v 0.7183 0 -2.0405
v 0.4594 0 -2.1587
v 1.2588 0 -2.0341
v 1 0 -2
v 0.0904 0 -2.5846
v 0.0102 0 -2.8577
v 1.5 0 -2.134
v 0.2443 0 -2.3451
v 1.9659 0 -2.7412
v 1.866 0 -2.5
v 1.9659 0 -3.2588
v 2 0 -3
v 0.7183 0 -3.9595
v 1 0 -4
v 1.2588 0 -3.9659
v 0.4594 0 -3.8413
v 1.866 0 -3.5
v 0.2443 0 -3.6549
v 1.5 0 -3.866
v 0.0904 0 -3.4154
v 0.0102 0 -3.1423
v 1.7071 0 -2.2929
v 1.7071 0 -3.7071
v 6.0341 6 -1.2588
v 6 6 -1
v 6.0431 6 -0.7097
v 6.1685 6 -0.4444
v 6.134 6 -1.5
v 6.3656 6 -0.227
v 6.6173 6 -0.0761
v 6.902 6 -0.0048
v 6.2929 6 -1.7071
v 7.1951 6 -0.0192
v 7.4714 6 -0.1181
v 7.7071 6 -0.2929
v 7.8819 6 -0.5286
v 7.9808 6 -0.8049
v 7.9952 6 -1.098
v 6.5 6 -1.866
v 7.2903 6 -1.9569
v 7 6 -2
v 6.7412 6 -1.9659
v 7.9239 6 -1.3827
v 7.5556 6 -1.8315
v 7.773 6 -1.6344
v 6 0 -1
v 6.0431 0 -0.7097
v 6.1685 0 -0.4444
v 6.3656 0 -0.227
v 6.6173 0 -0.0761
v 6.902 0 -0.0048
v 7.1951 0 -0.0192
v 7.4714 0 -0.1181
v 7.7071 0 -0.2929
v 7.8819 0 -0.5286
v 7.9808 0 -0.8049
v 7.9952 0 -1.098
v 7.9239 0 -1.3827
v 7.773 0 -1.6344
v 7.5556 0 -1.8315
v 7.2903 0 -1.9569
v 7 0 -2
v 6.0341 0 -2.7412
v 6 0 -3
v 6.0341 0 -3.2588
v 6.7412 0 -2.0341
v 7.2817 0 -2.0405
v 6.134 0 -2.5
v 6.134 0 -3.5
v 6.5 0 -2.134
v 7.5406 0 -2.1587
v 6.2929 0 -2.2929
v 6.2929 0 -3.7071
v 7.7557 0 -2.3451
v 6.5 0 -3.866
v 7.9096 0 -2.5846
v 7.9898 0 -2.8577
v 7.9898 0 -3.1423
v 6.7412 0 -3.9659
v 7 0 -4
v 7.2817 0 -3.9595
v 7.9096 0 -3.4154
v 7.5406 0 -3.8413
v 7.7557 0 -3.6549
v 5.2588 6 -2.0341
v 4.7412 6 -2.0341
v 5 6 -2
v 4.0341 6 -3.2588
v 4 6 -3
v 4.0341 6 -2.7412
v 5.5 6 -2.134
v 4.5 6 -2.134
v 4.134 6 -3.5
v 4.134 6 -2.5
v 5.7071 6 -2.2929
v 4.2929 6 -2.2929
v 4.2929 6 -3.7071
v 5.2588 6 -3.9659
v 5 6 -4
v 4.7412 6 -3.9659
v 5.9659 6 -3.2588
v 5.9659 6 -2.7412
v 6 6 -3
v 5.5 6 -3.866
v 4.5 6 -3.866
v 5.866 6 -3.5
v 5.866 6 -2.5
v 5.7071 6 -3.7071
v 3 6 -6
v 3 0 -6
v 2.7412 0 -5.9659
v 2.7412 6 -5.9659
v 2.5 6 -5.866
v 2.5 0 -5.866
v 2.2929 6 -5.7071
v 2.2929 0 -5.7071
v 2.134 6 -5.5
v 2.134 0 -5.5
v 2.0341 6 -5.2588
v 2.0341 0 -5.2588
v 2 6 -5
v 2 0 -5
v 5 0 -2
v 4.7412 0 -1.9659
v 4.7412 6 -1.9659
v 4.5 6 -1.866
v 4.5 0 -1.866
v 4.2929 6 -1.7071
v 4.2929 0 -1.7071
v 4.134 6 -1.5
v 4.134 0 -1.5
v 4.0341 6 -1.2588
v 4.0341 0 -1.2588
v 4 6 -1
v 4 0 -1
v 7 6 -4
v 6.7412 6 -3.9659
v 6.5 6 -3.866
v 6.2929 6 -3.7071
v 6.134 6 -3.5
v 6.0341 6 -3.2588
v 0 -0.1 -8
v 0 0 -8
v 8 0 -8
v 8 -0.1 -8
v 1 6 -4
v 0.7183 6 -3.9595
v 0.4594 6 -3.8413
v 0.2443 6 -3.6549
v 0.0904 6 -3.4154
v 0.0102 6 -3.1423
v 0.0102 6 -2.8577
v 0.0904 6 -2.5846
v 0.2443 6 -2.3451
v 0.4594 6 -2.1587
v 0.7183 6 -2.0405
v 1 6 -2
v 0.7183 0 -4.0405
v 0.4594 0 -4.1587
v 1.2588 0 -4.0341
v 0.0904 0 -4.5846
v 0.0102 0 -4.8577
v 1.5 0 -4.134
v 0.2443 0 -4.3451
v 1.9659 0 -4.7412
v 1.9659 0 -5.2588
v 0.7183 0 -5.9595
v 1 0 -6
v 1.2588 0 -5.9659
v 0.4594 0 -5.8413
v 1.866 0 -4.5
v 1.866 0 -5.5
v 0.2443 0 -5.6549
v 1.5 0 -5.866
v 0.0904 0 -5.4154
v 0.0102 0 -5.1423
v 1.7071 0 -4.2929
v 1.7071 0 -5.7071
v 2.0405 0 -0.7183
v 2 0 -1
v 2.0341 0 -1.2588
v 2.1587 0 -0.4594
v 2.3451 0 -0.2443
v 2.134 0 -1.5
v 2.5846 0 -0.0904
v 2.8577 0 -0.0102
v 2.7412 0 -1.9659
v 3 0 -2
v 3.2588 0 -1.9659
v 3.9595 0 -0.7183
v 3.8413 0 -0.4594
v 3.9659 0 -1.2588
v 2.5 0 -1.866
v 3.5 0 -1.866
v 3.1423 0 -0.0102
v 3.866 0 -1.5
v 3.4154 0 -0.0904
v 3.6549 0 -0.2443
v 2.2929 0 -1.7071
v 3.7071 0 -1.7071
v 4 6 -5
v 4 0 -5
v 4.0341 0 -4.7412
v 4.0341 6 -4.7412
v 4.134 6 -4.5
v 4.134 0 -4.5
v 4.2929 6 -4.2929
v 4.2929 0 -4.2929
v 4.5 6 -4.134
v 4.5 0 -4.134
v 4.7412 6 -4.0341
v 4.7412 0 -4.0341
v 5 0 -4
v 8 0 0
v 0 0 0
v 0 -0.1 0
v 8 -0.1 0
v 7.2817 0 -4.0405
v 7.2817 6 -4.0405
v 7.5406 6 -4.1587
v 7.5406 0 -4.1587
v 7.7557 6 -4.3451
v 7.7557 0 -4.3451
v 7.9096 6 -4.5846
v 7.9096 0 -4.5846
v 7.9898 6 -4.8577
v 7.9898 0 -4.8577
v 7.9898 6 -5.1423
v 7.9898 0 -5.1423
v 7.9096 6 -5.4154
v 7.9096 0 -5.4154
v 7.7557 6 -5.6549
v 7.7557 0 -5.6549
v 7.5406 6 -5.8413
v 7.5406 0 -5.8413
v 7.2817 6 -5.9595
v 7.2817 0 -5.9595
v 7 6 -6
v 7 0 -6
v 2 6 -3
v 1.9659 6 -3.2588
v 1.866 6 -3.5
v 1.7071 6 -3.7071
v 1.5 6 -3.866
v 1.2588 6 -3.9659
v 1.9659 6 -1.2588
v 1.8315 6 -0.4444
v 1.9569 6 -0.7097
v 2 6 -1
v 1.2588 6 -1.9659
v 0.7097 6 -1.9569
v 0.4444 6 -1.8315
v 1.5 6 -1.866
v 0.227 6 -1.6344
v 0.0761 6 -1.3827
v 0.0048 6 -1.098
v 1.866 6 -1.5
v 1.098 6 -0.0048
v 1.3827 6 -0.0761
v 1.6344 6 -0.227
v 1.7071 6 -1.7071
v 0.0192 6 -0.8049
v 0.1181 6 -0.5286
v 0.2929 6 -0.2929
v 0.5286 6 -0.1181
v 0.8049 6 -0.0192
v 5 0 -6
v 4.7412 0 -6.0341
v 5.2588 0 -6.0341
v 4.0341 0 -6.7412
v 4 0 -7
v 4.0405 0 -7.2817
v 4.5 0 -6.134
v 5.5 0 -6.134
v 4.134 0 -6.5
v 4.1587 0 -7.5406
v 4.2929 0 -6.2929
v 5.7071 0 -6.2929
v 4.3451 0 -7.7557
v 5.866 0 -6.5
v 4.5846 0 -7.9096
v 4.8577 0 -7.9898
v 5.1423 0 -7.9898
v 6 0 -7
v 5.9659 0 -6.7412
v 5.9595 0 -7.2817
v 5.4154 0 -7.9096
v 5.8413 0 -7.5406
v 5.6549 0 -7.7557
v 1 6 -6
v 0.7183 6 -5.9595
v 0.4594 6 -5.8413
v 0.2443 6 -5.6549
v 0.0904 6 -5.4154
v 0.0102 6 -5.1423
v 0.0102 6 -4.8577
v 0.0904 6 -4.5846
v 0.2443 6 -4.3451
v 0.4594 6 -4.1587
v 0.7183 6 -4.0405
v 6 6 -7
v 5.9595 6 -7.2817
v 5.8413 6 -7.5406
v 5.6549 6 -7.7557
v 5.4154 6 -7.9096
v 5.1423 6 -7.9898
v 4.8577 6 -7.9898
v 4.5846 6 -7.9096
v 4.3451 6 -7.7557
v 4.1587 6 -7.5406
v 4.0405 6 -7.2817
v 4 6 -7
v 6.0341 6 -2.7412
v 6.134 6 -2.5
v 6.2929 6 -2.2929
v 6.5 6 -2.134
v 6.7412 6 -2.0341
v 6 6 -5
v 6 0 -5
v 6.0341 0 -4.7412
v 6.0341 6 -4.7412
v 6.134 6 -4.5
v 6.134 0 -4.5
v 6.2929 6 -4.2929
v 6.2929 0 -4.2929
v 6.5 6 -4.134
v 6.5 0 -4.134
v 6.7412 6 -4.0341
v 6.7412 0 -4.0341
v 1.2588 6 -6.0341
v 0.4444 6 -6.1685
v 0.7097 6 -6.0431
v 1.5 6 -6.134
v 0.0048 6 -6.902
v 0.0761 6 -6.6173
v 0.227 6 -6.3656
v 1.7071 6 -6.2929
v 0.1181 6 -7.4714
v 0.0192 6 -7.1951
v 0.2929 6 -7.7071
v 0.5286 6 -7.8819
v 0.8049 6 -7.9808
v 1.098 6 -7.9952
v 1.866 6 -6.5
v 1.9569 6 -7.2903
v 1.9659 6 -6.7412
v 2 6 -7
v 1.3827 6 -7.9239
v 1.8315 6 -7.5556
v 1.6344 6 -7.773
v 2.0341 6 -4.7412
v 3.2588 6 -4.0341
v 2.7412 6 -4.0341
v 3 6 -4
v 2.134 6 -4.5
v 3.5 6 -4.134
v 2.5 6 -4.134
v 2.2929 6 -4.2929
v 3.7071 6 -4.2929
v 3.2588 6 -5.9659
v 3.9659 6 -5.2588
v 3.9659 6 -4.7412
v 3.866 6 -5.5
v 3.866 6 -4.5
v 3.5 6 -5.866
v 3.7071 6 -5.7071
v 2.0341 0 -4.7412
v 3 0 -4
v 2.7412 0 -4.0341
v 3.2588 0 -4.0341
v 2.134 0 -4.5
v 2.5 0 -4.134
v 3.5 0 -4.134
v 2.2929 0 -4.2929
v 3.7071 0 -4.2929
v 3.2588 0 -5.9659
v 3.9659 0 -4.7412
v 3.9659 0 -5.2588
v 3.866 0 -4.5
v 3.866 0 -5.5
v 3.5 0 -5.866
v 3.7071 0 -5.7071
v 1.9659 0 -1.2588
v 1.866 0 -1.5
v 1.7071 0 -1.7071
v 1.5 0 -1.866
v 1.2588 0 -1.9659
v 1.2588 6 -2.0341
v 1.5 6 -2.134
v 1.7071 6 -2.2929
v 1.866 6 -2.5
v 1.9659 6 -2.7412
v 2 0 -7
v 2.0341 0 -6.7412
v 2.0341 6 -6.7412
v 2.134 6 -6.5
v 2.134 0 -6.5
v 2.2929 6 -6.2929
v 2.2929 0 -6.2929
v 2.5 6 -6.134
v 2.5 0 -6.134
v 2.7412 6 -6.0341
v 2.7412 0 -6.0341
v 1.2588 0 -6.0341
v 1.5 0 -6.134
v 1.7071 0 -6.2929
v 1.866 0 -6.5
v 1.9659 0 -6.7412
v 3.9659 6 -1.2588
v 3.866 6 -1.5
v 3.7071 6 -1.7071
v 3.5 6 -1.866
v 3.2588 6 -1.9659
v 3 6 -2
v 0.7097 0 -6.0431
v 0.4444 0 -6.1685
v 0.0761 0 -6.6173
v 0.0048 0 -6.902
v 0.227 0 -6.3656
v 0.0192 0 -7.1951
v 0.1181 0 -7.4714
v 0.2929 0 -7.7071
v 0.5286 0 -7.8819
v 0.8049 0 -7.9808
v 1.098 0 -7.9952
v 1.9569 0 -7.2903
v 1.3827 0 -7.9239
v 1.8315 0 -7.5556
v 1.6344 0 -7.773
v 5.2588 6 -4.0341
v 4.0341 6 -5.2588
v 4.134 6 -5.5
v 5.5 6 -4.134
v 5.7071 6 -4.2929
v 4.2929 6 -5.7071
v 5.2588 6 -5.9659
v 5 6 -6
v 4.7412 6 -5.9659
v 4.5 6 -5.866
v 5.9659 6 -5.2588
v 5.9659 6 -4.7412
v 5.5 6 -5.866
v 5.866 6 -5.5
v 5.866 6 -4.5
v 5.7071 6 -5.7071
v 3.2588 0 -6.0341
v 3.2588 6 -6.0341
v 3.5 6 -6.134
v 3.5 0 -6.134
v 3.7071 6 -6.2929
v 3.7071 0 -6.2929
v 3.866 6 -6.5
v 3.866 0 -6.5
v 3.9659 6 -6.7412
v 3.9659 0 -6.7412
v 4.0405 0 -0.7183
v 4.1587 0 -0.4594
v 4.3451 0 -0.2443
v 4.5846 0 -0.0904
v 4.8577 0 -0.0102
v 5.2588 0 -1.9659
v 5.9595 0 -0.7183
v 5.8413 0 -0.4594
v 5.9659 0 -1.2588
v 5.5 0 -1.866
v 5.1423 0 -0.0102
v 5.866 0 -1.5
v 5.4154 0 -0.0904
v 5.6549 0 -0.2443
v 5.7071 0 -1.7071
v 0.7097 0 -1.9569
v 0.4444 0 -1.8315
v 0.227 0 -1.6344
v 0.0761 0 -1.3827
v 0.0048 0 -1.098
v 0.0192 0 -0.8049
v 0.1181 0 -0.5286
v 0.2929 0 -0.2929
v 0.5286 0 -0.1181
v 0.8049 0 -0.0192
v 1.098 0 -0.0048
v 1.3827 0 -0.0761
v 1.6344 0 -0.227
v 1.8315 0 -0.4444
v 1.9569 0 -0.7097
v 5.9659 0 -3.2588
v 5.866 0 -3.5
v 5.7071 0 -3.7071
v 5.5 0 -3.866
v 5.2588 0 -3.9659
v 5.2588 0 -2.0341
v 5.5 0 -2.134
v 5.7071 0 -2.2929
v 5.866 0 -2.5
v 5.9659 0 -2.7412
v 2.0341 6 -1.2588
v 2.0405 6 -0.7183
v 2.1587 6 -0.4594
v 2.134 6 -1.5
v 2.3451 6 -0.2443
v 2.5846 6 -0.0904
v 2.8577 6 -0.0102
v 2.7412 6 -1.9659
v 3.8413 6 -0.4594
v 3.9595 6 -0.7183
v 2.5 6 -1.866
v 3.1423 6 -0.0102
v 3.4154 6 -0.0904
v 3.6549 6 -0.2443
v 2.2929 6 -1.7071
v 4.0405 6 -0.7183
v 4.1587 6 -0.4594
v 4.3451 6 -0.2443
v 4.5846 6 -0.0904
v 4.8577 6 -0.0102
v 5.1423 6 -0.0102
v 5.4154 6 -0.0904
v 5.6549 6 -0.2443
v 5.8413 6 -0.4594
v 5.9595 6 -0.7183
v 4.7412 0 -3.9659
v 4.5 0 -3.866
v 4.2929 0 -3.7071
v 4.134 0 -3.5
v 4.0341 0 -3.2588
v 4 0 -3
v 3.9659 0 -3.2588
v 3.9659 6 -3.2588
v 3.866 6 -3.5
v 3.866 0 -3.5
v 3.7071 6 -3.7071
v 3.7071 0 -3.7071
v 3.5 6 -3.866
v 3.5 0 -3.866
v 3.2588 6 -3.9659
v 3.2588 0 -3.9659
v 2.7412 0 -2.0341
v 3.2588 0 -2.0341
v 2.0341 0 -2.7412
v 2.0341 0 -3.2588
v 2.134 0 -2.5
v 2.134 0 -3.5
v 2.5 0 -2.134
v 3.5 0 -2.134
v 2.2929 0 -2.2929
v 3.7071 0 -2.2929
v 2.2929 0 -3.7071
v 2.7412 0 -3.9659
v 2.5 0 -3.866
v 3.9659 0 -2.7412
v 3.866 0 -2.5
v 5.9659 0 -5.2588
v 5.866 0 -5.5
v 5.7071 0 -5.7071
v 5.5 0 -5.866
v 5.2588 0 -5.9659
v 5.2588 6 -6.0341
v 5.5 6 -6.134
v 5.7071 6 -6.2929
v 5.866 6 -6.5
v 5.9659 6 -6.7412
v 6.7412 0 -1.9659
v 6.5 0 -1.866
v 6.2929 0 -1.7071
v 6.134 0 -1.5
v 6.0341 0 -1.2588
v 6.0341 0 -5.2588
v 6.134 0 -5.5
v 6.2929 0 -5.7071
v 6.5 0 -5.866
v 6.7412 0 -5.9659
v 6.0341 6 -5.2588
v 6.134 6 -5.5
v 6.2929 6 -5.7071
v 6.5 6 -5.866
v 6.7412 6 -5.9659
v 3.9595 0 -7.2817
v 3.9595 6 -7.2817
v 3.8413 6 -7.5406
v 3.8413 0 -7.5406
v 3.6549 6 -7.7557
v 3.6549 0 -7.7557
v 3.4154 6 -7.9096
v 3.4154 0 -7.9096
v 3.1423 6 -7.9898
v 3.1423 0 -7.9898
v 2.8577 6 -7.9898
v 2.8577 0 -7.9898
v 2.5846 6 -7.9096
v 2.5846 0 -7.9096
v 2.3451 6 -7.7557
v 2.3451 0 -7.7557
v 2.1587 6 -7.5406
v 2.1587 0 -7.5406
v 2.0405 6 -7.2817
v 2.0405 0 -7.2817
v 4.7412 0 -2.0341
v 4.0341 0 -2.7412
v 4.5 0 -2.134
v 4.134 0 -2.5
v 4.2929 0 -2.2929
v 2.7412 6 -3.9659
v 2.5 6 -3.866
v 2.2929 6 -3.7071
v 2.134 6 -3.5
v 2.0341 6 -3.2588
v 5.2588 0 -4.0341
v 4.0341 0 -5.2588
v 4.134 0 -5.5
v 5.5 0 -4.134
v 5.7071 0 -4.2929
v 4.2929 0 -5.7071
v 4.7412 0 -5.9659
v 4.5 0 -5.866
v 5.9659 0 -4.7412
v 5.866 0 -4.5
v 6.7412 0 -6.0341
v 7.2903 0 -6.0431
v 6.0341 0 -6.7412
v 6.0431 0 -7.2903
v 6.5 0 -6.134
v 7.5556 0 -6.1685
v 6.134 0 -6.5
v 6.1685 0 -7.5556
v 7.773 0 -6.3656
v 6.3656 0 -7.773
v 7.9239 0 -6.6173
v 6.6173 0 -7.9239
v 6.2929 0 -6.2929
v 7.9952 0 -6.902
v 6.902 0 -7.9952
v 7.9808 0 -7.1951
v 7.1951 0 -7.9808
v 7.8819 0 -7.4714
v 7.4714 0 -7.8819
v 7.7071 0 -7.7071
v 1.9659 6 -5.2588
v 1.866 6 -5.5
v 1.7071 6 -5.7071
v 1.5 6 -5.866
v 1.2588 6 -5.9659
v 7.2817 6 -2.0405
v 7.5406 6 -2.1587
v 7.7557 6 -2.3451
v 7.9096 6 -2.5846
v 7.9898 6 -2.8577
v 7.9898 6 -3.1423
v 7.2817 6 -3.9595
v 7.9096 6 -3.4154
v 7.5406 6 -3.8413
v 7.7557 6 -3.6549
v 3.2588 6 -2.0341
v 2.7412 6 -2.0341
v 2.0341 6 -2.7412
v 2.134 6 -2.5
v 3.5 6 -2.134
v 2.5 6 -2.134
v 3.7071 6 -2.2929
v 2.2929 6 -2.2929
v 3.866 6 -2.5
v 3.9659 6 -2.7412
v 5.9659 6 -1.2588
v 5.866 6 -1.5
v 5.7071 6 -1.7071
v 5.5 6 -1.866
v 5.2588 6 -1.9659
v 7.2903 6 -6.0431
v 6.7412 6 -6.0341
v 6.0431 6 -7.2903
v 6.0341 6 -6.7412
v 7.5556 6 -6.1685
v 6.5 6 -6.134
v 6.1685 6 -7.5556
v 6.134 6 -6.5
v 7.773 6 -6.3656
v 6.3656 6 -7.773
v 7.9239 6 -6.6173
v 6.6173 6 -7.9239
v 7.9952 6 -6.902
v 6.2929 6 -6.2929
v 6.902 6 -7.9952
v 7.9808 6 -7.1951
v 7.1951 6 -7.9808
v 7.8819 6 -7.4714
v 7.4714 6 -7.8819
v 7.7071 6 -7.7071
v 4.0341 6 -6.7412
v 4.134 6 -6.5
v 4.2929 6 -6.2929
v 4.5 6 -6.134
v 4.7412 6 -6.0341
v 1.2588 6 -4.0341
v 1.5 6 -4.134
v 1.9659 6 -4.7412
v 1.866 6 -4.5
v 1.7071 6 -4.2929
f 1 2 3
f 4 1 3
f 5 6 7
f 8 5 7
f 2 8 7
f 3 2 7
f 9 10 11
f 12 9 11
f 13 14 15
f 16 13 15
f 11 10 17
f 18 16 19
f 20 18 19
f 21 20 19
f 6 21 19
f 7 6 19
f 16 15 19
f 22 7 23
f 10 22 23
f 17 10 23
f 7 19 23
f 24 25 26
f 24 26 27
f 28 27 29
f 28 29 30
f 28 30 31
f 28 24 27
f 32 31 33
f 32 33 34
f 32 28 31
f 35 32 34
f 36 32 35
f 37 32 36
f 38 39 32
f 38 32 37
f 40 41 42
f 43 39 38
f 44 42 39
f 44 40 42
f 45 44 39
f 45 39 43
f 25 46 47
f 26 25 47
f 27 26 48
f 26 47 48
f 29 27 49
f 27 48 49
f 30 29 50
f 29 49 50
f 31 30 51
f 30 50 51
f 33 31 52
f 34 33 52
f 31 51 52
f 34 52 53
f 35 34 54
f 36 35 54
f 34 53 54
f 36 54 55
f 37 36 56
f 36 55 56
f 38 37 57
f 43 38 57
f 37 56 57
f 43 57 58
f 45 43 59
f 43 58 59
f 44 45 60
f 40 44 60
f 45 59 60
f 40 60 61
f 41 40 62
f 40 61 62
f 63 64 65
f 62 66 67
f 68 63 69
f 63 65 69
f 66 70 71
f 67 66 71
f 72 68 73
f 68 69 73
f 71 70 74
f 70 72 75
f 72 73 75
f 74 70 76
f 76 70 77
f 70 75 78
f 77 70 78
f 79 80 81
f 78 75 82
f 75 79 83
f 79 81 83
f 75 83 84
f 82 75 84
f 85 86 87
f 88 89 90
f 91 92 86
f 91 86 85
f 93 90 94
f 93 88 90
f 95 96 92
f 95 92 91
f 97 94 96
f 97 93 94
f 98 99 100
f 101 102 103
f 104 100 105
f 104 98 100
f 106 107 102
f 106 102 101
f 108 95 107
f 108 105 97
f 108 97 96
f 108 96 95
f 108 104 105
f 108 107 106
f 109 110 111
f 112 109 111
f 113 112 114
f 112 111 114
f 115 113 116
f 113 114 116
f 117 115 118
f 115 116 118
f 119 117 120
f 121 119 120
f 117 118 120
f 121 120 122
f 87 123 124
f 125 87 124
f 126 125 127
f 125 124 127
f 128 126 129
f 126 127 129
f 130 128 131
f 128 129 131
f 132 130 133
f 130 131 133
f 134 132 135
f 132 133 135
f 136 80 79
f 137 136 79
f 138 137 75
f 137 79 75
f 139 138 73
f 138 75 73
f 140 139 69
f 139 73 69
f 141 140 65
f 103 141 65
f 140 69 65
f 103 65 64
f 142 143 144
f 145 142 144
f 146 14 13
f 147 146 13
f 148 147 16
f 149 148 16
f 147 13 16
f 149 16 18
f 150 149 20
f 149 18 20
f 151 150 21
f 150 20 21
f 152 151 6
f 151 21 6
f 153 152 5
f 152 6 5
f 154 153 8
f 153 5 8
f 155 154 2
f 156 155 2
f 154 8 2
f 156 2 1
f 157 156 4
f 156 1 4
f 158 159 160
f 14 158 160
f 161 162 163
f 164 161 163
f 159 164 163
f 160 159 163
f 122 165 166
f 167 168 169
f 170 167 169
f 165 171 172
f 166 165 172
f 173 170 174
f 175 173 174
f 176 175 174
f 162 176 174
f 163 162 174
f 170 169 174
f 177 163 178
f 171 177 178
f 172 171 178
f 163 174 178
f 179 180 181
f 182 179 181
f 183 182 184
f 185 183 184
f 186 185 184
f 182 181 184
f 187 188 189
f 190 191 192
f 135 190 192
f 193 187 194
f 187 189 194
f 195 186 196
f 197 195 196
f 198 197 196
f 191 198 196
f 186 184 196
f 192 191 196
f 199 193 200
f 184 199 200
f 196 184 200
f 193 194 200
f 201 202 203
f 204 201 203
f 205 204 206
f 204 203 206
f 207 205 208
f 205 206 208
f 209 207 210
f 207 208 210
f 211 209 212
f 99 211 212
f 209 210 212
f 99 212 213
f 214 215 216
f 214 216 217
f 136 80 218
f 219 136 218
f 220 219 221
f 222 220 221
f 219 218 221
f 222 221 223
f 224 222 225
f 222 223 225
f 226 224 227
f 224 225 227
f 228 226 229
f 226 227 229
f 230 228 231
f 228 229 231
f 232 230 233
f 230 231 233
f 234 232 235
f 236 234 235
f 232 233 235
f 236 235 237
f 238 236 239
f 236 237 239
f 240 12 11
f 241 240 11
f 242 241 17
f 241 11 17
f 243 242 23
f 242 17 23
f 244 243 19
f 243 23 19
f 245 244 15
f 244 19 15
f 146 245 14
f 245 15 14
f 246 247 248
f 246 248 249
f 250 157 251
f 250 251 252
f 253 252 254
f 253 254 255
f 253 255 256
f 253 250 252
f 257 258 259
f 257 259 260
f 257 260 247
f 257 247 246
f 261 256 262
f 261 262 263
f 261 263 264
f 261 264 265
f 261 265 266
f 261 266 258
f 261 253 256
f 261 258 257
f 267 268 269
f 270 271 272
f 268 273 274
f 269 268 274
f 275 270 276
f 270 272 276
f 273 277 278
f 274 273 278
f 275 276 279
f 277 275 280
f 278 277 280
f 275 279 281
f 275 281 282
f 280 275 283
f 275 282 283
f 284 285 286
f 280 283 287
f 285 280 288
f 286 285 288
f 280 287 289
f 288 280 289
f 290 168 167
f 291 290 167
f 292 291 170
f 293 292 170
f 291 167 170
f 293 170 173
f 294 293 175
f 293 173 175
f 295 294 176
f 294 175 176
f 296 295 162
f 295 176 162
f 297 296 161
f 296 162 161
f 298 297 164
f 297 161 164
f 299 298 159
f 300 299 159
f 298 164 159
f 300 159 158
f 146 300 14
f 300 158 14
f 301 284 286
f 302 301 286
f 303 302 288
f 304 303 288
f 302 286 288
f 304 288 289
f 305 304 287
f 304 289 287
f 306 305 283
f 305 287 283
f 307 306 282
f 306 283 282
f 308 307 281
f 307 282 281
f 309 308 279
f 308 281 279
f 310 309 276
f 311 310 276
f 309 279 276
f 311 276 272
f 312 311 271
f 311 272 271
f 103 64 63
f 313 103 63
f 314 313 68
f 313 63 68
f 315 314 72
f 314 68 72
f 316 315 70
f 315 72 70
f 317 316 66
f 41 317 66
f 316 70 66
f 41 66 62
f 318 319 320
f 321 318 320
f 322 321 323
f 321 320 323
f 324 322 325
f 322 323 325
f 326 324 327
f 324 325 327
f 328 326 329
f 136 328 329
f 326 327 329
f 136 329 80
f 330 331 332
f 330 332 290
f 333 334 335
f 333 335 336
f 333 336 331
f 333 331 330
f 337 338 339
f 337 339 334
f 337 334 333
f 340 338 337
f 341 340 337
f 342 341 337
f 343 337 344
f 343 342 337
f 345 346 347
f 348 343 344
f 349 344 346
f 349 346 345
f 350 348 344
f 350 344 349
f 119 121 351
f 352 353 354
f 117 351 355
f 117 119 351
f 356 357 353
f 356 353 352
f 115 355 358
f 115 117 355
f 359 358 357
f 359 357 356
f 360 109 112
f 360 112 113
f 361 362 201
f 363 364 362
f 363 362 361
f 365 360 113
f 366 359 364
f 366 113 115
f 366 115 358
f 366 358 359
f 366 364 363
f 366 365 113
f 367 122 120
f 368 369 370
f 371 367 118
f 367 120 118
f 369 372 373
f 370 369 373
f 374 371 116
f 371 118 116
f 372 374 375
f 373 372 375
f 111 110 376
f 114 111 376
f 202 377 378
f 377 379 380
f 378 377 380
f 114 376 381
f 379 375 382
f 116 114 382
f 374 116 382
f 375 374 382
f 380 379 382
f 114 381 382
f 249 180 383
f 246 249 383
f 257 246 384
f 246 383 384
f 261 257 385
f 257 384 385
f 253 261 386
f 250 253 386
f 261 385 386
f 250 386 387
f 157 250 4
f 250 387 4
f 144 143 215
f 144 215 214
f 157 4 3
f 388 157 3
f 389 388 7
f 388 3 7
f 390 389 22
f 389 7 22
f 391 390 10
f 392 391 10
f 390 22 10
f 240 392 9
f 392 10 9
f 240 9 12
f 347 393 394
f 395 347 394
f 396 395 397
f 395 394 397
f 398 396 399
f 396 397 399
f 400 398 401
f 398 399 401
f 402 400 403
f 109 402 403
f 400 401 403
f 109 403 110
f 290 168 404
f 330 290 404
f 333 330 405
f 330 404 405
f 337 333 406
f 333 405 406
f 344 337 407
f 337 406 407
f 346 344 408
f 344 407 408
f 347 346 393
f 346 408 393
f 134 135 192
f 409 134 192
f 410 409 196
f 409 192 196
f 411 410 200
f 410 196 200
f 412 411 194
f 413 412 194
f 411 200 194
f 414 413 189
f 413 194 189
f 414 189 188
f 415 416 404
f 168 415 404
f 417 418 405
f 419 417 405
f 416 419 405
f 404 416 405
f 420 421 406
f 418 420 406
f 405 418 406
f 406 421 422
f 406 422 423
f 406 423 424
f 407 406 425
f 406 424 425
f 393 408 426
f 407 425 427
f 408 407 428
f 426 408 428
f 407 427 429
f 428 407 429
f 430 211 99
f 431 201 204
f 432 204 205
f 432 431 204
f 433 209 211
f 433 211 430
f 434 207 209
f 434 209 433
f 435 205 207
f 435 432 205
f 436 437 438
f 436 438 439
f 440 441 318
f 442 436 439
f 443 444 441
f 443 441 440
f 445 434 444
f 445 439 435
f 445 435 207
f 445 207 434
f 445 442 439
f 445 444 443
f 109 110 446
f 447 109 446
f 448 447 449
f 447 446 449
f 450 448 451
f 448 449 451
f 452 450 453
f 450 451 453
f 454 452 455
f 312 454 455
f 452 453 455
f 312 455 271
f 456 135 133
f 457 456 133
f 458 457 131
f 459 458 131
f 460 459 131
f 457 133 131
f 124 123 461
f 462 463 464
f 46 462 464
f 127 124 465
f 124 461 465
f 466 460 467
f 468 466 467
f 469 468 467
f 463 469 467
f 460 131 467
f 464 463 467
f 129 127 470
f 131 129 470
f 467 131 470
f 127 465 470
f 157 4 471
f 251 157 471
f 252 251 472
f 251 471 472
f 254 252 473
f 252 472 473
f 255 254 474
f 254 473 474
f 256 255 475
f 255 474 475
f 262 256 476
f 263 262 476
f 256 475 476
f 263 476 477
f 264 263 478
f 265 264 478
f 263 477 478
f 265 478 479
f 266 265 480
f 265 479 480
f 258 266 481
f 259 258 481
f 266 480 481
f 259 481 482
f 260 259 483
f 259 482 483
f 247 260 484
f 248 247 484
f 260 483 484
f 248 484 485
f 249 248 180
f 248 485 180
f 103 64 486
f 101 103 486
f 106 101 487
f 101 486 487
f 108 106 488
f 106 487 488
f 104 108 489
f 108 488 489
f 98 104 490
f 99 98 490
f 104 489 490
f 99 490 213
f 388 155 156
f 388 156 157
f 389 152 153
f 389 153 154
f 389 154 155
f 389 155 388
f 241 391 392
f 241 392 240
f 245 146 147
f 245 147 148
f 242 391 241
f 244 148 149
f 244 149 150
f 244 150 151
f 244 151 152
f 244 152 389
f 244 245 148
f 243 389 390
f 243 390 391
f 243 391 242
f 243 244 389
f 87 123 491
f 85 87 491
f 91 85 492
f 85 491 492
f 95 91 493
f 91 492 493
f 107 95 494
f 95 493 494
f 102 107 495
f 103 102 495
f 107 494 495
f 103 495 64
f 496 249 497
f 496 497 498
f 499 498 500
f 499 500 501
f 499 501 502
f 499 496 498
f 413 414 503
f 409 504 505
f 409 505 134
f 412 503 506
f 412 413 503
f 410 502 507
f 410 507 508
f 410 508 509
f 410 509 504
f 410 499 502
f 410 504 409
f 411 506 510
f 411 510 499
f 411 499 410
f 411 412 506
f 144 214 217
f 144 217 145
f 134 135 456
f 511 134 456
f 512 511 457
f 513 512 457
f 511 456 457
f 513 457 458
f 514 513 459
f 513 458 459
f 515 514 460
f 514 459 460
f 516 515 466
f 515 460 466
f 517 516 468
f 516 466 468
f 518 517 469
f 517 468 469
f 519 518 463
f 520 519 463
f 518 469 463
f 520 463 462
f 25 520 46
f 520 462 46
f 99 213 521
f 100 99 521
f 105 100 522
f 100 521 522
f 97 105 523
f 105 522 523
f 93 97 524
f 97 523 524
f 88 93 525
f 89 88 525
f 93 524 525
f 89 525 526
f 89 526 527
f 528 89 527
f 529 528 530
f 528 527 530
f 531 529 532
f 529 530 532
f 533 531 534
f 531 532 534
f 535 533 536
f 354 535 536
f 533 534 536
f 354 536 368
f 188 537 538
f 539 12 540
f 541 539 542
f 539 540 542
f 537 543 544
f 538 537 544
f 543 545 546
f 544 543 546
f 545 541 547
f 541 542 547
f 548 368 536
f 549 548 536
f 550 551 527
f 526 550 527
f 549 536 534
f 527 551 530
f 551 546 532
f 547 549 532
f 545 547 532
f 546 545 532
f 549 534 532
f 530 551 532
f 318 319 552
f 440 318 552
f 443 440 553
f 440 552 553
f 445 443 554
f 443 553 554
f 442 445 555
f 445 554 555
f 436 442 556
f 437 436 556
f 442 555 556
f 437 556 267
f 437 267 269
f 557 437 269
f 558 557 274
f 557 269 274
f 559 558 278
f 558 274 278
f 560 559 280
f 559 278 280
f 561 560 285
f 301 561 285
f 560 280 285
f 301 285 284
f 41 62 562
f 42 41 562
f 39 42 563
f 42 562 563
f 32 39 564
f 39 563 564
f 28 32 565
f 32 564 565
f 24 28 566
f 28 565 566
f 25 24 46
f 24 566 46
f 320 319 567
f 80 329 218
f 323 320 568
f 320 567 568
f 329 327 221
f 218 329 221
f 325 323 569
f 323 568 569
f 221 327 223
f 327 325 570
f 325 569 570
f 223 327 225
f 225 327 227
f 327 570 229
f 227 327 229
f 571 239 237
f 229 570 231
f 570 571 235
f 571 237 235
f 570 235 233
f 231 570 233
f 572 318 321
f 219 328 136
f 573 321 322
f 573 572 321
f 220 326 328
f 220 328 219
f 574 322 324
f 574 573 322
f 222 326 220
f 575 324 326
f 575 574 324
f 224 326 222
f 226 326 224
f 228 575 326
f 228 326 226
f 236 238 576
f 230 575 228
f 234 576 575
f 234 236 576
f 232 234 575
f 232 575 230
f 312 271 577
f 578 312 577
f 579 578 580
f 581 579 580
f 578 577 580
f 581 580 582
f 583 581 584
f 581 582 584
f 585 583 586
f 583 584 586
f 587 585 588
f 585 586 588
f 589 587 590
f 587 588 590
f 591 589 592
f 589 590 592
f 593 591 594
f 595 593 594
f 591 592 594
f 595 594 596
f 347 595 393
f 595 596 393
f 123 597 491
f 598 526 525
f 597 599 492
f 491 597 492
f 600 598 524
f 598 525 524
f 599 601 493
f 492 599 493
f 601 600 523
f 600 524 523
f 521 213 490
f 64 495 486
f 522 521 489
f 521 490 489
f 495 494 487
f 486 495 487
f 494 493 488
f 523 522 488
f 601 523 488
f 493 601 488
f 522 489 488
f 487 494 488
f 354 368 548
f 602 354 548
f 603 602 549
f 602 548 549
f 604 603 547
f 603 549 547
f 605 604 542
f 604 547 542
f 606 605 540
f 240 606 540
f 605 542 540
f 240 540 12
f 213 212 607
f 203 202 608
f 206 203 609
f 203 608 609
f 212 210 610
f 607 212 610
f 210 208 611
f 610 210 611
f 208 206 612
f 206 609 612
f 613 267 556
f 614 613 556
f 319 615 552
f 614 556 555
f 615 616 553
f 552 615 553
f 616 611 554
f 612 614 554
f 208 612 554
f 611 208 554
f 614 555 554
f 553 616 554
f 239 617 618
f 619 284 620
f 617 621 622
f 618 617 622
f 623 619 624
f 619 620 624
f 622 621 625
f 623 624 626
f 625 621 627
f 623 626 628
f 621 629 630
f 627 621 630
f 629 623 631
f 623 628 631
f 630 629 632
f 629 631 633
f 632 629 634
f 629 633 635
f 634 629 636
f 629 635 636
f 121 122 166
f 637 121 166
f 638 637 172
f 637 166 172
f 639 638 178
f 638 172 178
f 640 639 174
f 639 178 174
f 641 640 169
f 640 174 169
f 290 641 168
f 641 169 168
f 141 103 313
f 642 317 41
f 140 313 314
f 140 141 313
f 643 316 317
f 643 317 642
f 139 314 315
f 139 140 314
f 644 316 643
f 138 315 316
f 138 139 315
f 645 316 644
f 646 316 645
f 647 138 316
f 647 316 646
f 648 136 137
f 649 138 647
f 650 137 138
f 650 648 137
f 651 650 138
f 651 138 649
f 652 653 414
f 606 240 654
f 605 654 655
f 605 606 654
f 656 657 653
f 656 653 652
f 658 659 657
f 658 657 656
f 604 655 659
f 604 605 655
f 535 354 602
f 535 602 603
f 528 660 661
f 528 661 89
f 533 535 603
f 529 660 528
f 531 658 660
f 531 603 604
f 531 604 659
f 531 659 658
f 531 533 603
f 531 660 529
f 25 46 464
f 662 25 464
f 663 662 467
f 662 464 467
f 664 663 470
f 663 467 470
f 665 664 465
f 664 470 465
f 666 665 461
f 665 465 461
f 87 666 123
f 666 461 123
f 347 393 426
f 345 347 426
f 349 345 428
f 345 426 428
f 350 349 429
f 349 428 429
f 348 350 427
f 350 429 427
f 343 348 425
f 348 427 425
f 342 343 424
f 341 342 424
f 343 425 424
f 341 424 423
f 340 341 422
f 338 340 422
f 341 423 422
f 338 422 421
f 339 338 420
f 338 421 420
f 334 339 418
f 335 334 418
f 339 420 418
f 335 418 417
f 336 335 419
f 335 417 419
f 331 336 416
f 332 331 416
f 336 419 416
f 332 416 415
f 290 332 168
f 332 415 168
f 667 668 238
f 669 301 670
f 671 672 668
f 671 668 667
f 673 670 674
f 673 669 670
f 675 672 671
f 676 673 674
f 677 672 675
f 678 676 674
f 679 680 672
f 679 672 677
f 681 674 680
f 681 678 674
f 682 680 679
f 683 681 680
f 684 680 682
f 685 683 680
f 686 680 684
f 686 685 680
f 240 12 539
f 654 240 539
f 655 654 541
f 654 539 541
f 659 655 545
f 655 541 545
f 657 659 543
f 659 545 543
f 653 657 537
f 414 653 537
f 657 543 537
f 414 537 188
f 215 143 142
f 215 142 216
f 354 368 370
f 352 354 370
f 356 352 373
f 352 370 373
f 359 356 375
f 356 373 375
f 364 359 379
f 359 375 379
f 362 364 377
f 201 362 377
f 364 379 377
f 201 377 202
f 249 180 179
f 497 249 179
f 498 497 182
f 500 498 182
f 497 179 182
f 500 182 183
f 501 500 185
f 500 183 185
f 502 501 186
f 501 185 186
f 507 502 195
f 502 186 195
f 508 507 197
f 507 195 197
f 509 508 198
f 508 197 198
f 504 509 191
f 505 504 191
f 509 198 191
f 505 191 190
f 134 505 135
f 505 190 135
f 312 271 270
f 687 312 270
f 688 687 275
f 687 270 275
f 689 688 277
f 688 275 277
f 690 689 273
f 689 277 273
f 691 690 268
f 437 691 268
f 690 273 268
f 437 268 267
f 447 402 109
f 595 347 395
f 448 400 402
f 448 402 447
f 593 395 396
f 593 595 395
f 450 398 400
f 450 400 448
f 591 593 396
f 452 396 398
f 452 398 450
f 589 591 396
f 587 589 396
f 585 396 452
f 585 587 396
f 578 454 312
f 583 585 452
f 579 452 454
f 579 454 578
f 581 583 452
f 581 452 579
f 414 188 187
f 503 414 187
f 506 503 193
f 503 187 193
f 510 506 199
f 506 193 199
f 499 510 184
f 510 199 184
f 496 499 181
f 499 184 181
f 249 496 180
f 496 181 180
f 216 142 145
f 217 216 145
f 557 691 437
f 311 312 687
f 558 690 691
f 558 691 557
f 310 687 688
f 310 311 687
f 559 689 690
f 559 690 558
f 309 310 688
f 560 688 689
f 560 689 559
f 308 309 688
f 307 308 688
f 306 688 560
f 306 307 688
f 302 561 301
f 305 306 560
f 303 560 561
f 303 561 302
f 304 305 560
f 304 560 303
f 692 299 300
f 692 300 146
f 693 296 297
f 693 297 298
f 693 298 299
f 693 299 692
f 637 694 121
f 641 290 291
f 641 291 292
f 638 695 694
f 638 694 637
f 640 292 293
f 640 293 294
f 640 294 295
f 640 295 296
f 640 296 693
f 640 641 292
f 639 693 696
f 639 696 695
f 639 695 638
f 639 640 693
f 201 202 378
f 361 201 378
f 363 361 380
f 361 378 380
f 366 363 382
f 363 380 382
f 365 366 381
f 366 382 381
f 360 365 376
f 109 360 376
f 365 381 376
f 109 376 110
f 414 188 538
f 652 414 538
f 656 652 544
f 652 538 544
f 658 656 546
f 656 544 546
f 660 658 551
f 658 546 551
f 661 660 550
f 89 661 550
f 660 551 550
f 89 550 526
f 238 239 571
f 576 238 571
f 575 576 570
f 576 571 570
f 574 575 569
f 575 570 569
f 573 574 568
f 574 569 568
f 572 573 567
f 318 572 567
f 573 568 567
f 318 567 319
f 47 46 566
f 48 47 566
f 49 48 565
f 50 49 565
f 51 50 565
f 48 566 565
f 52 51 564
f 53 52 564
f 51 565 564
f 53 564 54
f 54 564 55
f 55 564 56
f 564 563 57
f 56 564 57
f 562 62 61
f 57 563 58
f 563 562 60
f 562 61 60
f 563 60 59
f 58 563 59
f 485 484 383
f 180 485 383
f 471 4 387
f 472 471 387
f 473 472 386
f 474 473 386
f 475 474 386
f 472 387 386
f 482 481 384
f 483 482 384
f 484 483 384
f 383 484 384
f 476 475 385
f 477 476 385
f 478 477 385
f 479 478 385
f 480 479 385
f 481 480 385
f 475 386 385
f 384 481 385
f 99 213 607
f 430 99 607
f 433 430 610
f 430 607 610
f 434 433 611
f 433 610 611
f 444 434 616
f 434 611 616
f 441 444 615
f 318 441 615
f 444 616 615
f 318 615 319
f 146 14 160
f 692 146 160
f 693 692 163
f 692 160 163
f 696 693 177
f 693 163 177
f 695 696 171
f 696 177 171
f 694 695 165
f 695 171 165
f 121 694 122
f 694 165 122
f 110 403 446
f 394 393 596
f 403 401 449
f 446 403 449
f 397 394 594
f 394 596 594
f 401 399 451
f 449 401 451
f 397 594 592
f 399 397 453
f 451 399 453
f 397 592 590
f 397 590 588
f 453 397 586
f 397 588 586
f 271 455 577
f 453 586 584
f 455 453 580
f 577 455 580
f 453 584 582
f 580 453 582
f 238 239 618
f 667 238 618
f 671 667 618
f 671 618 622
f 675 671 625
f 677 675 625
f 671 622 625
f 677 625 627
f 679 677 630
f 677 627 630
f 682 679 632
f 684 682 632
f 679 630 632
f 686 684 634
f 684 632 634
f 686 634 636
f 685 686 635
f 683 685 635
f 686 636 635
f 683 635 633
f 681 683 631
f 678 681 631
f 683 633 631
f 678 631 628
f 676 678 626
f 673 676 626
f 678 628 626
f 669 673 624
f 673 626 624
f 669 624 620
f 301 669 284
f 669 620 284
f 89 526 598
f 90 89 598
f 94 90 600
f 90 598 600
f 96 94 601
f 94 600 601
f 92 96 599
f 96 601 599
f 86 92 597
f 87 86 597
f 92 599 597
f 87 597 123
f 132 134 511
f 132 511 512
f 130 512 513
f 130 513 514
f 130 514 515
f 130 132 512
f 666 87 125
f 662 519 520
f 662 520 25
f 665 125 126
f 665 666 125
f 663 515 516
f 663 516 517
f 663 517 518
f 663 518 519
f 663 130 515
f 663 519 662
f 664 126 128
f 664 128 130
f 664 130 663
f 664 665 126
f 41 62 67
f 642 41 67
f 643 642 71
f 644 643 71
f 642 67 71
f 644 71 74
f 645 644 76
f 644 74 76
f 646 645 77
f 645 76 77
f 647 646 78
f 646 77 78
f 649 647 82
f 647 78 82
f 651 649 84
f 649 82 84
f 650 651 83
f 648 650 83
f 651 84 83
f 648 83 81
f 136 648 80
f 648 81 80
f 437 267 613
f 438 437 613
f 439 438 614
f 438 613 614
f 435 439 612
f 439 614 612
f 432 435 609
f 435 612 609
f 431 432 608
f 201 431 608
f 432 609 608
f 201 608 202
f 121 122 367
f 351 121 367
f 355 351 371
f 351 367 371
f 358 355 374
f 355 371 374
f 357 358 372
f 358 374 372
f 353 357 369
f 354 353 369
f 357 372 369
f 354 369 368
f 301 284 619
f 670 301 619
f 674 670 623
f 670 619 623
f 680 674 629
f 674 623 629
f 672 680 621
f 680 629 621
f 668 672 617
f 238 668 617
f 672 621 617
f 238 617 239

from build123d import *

# Parameters (mm, degrees)
SKETCH1_R              = 1
SKETCH1_W              = 8
SKETCH1_H              = 8
BOSS_EXTRUDE1_DEPTH    = 0.1
BOSS_EXTRUDE6_DEPTH    = 6
BOSS_EXTRUDE6_2_DEPTH  = 6
BOSS_EXTRUDE6_3_DEPTH  = 6
BOSS_EXTRUDE6_4_DEPTH  = 6
BOSS_EXTRUDE6_5_DEPTH  = 6
BOSS_EXTRUDE6_6_DEPTH  = 6
BOSS_EXTRUDE6_7_DEPTH  = 6
BOSS_EXTRUDE6_8_DEPTH  = 6
BOSS_EXTRUDE6_9_DEPTH  = 6
BOSS_EXTRUDE6_10_DEPTH = 6
BOSS_EXTRUDE6_11_DEPTH = 6
BOSS_EXTRUDE6_12_DEPTH = 6
BOSS_EXTRUDE6_13_DEPTH = 6
BOSS_EXTRUDE6_14_DEPTH = 6
BOSS_EXTRUDE6_15_DEPTH = 6
BOSS_EXTRUDE6_16_DEPTH = 6


with BuildPart() as part:
    # Sketch1 → Boss-Extrude1 (new body)
    with BuildSketch(Plane(origin=(0, 0, 0), x_dir=(1, 0, 0), z_dir=(0, 1, 0))):
        with Locations((3, 1)):
            Circle(SKETCH1_R)
        with Locations((3, 3)):
            Circle(SKETCH1_R)
        with Locations((1, 3)):
            Circle(SKETCH1_R)
        with Locations((1, 1)):
            Circle(SKETCH1_R)
        with Locations((4, 4)):
            Rectangle(SKETCH1_W, SKETCH1_H)
    extrude(amount=-BOSS_EXTRUDE1_DEPTH)


with BuildPart() as body_2:
    # Sketch1<5> → Boss-Extrude6 (new body)
    with BuildSketch(Plane(origin=(0, 0, 0), x_dir=(1, 0, 0), z_dir=(0, 1, 0))):
        with BuildLine():
            ThreePointArc((2, 1), (1.707106781, 1.707106781), (1, 2))
            ThreePointArc((1, 2), (0.292893219, 0.292893219), (2, 1))
        make_face()
    extrude(amount=BOSS_EXTRUDE6_DEPTH)


with BuildPart() as body_3:
    # Sketch1<5> → Boss-Extrude6 2 (new body)
    with BuildSketch(Plane(origin=(0, 0, 0), x_dir=(1, 0, 0), z_dir=(0, 1, 0))):
        with BuildLine():
            ThreePointArc((2, 1), (3, 0), (4, 1))
            ThreePointArc((4, 1), (3.707106781, 1.707106781), (3, 2))
            ThreePointArc((3, 2), (2.292893219, 1.707106781), (2, 1))
        make_face()
    extrude(amount=BOSS_EXTRUDE6_2_DEPTH)


with BuildPart() as body_4:
    # Sketch1<5> → Boss-Extrude6 3 (new body)
    with BuildSketch(Plane(origin=(0, 0, 0), x_dir=(1, 0, 0), z_dir=(0, 1, 0))):
        with BuildLine():
            ThreePointArc((1, 2), (1.707106781, 2.292893219), (2, 3))
            ThreePointArc((2, 3), (1.707106781, 3.707106781), (1, 4))
            ThreePointArc((1, 4), (0, 3), (1, 2))
        make_face()
    extrude(amount=BOSS_EXTRUDE6_3_DEPTH)


with BuildPart() as body_5:
    # Sketch1<5> → Boss-Extrude6 4 (new body)
    with BuildSketch(Plane(origin=(0, 0, 0), x_dir=(1, 0, 0), z_dir=(0, 1, 0))):
        with BuildLine():
            ThreePointArc((4, 1), (5, 0), (6, 1))
            ThreePointArc((6, 1), (5.707106781, 1.707106781), (5, 2))
            ThreePointArc((5, 2), (4.292893219, 1.707106781), (4, 1))
        make_face()
    extrude(amount=BOSS_EXTRUDE6_4_DEPTH)


with BuildPart() as body_6:
    # Sketch1<5> → Boss-Extrude6 5 (new body)
    with BuildSketch(Plane(origin=(0, 0, 0), x_dir=(1, 0, 0), z_dir=(0, 1, 0))):
        with BuildLine():
            ThreePointArc((2, 3), (2.292893219, 2.292893219), (3, 2))
            ThreePointArc((3, 2), (3.707106781, 2.292893219), (4, 3))
            ThreePointArc((4, 3), (3.707106781, 3.707106781), (3, 4))
            ThreePointArc((3, 4), (2.292893219, 3.707106781), (2, 3))
        make_face()
    extrude(amount=BOSS_EXTRUDE6_5_DEPTH)


with BuildPart() as body_7:
    # Sketch1<5> → Boss-Extrude6 6 (new body)
    with BuildSketch(Plane(origin=(0, 0, 0), x_dir=(1, 0, 0), z_dir=(0, 1, 0))):
        with BuildLine():
            ThreePointArc((1, 4), (1.707106781, 4.292893219), (2, 5))
            ThreePointArc((2, 5), (1.707106781, 5.707106781), (1, 6))
            ThreePointArc((1, 6), (0, 5), (1, 4))
        make_face()
    extrude(amount=BOSS_EXTRUDE6_6_DEPTH)


with BuildPart() as body_8:
    # Sketch1<5> → Boss-Extrude6 7 (new body)
    with BuildSketch(Plane(origin=(0, 0, 0), x_dir=(1, 0, 0), z_dir=(0, 1, 0))):
        with BuildLine():
            ThreePointArc((6, 1), (7.707106781, 0.292893219), (7, 2))
            ThreePointArc((7, 2), (6.292893219, 1.707106781), (6, 1))
        make_face()
    extrude(amount=BOSS_EXTRUDE6_7_DEPTH)


with BuildPart() as body_9:
    # Sketch1<5> → Boss-Extrude6 8 (new body)
    with BuildSketch(Plane(origin=(0, 0, 0), x_dir=(1, 0, 0), z_dir=(0, 1, 0))):
        with BuildLine():
            ThreePointArc((4, 3), (4.292893219, 2.292893219), (5, 2))
            ThreePointArc((5, 2), (5.707106781, 2.292893219), (6, 3))
            ThreePointArc((6, 3), (5.707106781, 3.707106781), (5, 4))
            ThreePointArc((5, 4), (4.292893219, 3.707106781), (4, 3))
        make_face()
    extrude(amount=BOSS_EXTRUDE6_8_DEPTH)


with BuildPart() as body_10:
    # Sketch1<5> → Boss-Extrude6 9 (new body)
    with BuildSketch(Plane(origin=(0, 0, 0), x_dir=(1, 0, 0), z_dir=(0, 1, 0))):
        with BuildLine():
            ThreePointArc((1, 6), (1.707106781, 6.292893219), (2, 7))
            ThreePointArc((2, 7), (0.292893219, 7.707106781), (1, 6))
        make_face()
    extrude(amount=BOSS_EXTRUDE6_9_DEPTH)


with BuildPart() as body_11:
    # Sketch1<5> → Boss-Extrude6 10 (new body)
    with BuildSketch(Plane(origin=(0, 0, 0), x_dir=(1, 0, 0), z_dir=(0, 1, 0))):
        with BuildLine():
            ThreePointArc((3, 4), (3.707106781, 4.292893219), (4, 5))
            ThreePointArc((4, 5), (3.707106781, 5.707106781), (3, 6))
            ThreePointArc((3, 6), (2.292893219, 5.707106781), (2, 5))
            ThreePointArc((2, 5), (2.292893219, 4.292893219), (3, 4))
        make_face()
    extrude(amount=BOSS_EXTRUDE6_10_DEPTH)


with BuildPart() as body_12:
    # Sketch1<5> → Boss-Extrude6 11 (new body)
    with BuildSketch(Plane(origin=(0, 0, 0), x_dir=(1, 0, 0), z_dir=(0, 1, 0))):
        with BuildLine():
            ThreePointArc((6, 3), (6.292893219, 2.292893219), (7, 2))
            ThreePointArc((7, 2), (8, 3), (7, 4))
            ThreePointArc((7, 4), (6.292893219, 3.707106781), (6, 3))
        make_face()
    extrude(amount=BOSS_EXTRUDE6_11_DEPTH)


with BuildPart() as body_13:
    # Sketch1<5> → Boss-Extrude6 12 (new body)
    with BuildSketch(Plane(origin=(0, 0, 0), x_dir=(1, 0, 0), z_dir=(0, 1, 0))):
        with BuildLine():
            ThreePointArc((4, 5), (4.292893219, 4.292893219), (5, 4))
            ThreePointArc((5, 4), (5.707106781, 4.292893219), (6, 5))
            ThreePointArc((6, 5), (5.707106781, 5.707106781), (5, 6))
            ThreePointArc((5, 6), (4.292893219, 5.707106781), (4, 5))
        make_face()
    extrude(amount=BOSS_EXTRUDE6_12_DEPTH)


with BuildPart() as body_14:
    # Sketch1<5> → Boss-Extrude6 13 (new body)
    with BuildSketch(Plane(origin=(0, 0, 0), x_dir=(1, 0, 0), z_dir=(0, 1, 0))):
        with BuildLine():
            ThreePointArc((3, 6), (3.707106781, 6.292893219), (4, 7))
            ThreePointArc((4, 7), (3, 8), (2, 7))
            ThreePointArc((2, 7), (2.292893219, 6.292893219), (3, 6))
        make_face()
    extrude(amount=BOSS_EXTRUDE6_13_DEPTH)


with BuildPart() as body_15:
    # Sketch1<5> → Boss-Extrude6 14 (new body)
    with BuildSketch(Plane(origin=(0, 0, 0), x_dir=(1, 0, 0), z_dir=(0, 1, 0))):
        with BuildLine():
            ThreePointArc((6, 5), (6.292893219, 4.292893219), (7, 4))
            ThreePointArc((7, 4), (8, 5), (7, 6))
            ThreePointArc((7, 6), (6.292893219, 5.707106781), (6, 5))
        make_face()
    extrude(amount=BOSS_EXTRUDE6_14_DEPTH)


with BuildPart() as body_16:
    # Sketch1<5> → Boss-Extrude6 15 (new body)
    with BuildSketch(Plane(origin=(0, 0, 0), x_dir=(1, 0, 0), z_dir=(0, 1, 0))):
        with BuildLine():
            ThreePointArc((5, 6), (5.707106781, 6.292893219), (6, 7))
            ThreePointArc((6, 7), (5, 8), (4, 7))
            ThreePointArc((4, 7), (4.292893219, 6.292893219), (5, 6))
        make_face()
    extrude(amount=BOSS_EXTRUDE6_15_DEPTH)


with BuildPart() as body_17:
    # Sketch1<5> → Boss-Extrude6 16 (new body)
    with BuildSketch(Plane(origin=(0, 0, 0), x_dir=(1, 0, 0), z_dir=(0, 1, 0))):
        with BuildLine():
            ThreePointArc((6, 7), (6.292893219, 6.292893219), (7, 6))
            ThreePointArc((7, 6), (7.707106781, 7.707106781), (6, 7))
        make_face()
    extrude(amount=BOSS_EXTRUDE6_16_DEPTH)


solid = Compound([part.part, body_2.part, body_3.part, body_4.part, body_5.part, body_6.part, body_7.part, body_8.part, body_9.part, body_10.part, body_11.part, body_12.part, body_13.part, body_14.part, body_15.part, body_16.part, body_17.part])
